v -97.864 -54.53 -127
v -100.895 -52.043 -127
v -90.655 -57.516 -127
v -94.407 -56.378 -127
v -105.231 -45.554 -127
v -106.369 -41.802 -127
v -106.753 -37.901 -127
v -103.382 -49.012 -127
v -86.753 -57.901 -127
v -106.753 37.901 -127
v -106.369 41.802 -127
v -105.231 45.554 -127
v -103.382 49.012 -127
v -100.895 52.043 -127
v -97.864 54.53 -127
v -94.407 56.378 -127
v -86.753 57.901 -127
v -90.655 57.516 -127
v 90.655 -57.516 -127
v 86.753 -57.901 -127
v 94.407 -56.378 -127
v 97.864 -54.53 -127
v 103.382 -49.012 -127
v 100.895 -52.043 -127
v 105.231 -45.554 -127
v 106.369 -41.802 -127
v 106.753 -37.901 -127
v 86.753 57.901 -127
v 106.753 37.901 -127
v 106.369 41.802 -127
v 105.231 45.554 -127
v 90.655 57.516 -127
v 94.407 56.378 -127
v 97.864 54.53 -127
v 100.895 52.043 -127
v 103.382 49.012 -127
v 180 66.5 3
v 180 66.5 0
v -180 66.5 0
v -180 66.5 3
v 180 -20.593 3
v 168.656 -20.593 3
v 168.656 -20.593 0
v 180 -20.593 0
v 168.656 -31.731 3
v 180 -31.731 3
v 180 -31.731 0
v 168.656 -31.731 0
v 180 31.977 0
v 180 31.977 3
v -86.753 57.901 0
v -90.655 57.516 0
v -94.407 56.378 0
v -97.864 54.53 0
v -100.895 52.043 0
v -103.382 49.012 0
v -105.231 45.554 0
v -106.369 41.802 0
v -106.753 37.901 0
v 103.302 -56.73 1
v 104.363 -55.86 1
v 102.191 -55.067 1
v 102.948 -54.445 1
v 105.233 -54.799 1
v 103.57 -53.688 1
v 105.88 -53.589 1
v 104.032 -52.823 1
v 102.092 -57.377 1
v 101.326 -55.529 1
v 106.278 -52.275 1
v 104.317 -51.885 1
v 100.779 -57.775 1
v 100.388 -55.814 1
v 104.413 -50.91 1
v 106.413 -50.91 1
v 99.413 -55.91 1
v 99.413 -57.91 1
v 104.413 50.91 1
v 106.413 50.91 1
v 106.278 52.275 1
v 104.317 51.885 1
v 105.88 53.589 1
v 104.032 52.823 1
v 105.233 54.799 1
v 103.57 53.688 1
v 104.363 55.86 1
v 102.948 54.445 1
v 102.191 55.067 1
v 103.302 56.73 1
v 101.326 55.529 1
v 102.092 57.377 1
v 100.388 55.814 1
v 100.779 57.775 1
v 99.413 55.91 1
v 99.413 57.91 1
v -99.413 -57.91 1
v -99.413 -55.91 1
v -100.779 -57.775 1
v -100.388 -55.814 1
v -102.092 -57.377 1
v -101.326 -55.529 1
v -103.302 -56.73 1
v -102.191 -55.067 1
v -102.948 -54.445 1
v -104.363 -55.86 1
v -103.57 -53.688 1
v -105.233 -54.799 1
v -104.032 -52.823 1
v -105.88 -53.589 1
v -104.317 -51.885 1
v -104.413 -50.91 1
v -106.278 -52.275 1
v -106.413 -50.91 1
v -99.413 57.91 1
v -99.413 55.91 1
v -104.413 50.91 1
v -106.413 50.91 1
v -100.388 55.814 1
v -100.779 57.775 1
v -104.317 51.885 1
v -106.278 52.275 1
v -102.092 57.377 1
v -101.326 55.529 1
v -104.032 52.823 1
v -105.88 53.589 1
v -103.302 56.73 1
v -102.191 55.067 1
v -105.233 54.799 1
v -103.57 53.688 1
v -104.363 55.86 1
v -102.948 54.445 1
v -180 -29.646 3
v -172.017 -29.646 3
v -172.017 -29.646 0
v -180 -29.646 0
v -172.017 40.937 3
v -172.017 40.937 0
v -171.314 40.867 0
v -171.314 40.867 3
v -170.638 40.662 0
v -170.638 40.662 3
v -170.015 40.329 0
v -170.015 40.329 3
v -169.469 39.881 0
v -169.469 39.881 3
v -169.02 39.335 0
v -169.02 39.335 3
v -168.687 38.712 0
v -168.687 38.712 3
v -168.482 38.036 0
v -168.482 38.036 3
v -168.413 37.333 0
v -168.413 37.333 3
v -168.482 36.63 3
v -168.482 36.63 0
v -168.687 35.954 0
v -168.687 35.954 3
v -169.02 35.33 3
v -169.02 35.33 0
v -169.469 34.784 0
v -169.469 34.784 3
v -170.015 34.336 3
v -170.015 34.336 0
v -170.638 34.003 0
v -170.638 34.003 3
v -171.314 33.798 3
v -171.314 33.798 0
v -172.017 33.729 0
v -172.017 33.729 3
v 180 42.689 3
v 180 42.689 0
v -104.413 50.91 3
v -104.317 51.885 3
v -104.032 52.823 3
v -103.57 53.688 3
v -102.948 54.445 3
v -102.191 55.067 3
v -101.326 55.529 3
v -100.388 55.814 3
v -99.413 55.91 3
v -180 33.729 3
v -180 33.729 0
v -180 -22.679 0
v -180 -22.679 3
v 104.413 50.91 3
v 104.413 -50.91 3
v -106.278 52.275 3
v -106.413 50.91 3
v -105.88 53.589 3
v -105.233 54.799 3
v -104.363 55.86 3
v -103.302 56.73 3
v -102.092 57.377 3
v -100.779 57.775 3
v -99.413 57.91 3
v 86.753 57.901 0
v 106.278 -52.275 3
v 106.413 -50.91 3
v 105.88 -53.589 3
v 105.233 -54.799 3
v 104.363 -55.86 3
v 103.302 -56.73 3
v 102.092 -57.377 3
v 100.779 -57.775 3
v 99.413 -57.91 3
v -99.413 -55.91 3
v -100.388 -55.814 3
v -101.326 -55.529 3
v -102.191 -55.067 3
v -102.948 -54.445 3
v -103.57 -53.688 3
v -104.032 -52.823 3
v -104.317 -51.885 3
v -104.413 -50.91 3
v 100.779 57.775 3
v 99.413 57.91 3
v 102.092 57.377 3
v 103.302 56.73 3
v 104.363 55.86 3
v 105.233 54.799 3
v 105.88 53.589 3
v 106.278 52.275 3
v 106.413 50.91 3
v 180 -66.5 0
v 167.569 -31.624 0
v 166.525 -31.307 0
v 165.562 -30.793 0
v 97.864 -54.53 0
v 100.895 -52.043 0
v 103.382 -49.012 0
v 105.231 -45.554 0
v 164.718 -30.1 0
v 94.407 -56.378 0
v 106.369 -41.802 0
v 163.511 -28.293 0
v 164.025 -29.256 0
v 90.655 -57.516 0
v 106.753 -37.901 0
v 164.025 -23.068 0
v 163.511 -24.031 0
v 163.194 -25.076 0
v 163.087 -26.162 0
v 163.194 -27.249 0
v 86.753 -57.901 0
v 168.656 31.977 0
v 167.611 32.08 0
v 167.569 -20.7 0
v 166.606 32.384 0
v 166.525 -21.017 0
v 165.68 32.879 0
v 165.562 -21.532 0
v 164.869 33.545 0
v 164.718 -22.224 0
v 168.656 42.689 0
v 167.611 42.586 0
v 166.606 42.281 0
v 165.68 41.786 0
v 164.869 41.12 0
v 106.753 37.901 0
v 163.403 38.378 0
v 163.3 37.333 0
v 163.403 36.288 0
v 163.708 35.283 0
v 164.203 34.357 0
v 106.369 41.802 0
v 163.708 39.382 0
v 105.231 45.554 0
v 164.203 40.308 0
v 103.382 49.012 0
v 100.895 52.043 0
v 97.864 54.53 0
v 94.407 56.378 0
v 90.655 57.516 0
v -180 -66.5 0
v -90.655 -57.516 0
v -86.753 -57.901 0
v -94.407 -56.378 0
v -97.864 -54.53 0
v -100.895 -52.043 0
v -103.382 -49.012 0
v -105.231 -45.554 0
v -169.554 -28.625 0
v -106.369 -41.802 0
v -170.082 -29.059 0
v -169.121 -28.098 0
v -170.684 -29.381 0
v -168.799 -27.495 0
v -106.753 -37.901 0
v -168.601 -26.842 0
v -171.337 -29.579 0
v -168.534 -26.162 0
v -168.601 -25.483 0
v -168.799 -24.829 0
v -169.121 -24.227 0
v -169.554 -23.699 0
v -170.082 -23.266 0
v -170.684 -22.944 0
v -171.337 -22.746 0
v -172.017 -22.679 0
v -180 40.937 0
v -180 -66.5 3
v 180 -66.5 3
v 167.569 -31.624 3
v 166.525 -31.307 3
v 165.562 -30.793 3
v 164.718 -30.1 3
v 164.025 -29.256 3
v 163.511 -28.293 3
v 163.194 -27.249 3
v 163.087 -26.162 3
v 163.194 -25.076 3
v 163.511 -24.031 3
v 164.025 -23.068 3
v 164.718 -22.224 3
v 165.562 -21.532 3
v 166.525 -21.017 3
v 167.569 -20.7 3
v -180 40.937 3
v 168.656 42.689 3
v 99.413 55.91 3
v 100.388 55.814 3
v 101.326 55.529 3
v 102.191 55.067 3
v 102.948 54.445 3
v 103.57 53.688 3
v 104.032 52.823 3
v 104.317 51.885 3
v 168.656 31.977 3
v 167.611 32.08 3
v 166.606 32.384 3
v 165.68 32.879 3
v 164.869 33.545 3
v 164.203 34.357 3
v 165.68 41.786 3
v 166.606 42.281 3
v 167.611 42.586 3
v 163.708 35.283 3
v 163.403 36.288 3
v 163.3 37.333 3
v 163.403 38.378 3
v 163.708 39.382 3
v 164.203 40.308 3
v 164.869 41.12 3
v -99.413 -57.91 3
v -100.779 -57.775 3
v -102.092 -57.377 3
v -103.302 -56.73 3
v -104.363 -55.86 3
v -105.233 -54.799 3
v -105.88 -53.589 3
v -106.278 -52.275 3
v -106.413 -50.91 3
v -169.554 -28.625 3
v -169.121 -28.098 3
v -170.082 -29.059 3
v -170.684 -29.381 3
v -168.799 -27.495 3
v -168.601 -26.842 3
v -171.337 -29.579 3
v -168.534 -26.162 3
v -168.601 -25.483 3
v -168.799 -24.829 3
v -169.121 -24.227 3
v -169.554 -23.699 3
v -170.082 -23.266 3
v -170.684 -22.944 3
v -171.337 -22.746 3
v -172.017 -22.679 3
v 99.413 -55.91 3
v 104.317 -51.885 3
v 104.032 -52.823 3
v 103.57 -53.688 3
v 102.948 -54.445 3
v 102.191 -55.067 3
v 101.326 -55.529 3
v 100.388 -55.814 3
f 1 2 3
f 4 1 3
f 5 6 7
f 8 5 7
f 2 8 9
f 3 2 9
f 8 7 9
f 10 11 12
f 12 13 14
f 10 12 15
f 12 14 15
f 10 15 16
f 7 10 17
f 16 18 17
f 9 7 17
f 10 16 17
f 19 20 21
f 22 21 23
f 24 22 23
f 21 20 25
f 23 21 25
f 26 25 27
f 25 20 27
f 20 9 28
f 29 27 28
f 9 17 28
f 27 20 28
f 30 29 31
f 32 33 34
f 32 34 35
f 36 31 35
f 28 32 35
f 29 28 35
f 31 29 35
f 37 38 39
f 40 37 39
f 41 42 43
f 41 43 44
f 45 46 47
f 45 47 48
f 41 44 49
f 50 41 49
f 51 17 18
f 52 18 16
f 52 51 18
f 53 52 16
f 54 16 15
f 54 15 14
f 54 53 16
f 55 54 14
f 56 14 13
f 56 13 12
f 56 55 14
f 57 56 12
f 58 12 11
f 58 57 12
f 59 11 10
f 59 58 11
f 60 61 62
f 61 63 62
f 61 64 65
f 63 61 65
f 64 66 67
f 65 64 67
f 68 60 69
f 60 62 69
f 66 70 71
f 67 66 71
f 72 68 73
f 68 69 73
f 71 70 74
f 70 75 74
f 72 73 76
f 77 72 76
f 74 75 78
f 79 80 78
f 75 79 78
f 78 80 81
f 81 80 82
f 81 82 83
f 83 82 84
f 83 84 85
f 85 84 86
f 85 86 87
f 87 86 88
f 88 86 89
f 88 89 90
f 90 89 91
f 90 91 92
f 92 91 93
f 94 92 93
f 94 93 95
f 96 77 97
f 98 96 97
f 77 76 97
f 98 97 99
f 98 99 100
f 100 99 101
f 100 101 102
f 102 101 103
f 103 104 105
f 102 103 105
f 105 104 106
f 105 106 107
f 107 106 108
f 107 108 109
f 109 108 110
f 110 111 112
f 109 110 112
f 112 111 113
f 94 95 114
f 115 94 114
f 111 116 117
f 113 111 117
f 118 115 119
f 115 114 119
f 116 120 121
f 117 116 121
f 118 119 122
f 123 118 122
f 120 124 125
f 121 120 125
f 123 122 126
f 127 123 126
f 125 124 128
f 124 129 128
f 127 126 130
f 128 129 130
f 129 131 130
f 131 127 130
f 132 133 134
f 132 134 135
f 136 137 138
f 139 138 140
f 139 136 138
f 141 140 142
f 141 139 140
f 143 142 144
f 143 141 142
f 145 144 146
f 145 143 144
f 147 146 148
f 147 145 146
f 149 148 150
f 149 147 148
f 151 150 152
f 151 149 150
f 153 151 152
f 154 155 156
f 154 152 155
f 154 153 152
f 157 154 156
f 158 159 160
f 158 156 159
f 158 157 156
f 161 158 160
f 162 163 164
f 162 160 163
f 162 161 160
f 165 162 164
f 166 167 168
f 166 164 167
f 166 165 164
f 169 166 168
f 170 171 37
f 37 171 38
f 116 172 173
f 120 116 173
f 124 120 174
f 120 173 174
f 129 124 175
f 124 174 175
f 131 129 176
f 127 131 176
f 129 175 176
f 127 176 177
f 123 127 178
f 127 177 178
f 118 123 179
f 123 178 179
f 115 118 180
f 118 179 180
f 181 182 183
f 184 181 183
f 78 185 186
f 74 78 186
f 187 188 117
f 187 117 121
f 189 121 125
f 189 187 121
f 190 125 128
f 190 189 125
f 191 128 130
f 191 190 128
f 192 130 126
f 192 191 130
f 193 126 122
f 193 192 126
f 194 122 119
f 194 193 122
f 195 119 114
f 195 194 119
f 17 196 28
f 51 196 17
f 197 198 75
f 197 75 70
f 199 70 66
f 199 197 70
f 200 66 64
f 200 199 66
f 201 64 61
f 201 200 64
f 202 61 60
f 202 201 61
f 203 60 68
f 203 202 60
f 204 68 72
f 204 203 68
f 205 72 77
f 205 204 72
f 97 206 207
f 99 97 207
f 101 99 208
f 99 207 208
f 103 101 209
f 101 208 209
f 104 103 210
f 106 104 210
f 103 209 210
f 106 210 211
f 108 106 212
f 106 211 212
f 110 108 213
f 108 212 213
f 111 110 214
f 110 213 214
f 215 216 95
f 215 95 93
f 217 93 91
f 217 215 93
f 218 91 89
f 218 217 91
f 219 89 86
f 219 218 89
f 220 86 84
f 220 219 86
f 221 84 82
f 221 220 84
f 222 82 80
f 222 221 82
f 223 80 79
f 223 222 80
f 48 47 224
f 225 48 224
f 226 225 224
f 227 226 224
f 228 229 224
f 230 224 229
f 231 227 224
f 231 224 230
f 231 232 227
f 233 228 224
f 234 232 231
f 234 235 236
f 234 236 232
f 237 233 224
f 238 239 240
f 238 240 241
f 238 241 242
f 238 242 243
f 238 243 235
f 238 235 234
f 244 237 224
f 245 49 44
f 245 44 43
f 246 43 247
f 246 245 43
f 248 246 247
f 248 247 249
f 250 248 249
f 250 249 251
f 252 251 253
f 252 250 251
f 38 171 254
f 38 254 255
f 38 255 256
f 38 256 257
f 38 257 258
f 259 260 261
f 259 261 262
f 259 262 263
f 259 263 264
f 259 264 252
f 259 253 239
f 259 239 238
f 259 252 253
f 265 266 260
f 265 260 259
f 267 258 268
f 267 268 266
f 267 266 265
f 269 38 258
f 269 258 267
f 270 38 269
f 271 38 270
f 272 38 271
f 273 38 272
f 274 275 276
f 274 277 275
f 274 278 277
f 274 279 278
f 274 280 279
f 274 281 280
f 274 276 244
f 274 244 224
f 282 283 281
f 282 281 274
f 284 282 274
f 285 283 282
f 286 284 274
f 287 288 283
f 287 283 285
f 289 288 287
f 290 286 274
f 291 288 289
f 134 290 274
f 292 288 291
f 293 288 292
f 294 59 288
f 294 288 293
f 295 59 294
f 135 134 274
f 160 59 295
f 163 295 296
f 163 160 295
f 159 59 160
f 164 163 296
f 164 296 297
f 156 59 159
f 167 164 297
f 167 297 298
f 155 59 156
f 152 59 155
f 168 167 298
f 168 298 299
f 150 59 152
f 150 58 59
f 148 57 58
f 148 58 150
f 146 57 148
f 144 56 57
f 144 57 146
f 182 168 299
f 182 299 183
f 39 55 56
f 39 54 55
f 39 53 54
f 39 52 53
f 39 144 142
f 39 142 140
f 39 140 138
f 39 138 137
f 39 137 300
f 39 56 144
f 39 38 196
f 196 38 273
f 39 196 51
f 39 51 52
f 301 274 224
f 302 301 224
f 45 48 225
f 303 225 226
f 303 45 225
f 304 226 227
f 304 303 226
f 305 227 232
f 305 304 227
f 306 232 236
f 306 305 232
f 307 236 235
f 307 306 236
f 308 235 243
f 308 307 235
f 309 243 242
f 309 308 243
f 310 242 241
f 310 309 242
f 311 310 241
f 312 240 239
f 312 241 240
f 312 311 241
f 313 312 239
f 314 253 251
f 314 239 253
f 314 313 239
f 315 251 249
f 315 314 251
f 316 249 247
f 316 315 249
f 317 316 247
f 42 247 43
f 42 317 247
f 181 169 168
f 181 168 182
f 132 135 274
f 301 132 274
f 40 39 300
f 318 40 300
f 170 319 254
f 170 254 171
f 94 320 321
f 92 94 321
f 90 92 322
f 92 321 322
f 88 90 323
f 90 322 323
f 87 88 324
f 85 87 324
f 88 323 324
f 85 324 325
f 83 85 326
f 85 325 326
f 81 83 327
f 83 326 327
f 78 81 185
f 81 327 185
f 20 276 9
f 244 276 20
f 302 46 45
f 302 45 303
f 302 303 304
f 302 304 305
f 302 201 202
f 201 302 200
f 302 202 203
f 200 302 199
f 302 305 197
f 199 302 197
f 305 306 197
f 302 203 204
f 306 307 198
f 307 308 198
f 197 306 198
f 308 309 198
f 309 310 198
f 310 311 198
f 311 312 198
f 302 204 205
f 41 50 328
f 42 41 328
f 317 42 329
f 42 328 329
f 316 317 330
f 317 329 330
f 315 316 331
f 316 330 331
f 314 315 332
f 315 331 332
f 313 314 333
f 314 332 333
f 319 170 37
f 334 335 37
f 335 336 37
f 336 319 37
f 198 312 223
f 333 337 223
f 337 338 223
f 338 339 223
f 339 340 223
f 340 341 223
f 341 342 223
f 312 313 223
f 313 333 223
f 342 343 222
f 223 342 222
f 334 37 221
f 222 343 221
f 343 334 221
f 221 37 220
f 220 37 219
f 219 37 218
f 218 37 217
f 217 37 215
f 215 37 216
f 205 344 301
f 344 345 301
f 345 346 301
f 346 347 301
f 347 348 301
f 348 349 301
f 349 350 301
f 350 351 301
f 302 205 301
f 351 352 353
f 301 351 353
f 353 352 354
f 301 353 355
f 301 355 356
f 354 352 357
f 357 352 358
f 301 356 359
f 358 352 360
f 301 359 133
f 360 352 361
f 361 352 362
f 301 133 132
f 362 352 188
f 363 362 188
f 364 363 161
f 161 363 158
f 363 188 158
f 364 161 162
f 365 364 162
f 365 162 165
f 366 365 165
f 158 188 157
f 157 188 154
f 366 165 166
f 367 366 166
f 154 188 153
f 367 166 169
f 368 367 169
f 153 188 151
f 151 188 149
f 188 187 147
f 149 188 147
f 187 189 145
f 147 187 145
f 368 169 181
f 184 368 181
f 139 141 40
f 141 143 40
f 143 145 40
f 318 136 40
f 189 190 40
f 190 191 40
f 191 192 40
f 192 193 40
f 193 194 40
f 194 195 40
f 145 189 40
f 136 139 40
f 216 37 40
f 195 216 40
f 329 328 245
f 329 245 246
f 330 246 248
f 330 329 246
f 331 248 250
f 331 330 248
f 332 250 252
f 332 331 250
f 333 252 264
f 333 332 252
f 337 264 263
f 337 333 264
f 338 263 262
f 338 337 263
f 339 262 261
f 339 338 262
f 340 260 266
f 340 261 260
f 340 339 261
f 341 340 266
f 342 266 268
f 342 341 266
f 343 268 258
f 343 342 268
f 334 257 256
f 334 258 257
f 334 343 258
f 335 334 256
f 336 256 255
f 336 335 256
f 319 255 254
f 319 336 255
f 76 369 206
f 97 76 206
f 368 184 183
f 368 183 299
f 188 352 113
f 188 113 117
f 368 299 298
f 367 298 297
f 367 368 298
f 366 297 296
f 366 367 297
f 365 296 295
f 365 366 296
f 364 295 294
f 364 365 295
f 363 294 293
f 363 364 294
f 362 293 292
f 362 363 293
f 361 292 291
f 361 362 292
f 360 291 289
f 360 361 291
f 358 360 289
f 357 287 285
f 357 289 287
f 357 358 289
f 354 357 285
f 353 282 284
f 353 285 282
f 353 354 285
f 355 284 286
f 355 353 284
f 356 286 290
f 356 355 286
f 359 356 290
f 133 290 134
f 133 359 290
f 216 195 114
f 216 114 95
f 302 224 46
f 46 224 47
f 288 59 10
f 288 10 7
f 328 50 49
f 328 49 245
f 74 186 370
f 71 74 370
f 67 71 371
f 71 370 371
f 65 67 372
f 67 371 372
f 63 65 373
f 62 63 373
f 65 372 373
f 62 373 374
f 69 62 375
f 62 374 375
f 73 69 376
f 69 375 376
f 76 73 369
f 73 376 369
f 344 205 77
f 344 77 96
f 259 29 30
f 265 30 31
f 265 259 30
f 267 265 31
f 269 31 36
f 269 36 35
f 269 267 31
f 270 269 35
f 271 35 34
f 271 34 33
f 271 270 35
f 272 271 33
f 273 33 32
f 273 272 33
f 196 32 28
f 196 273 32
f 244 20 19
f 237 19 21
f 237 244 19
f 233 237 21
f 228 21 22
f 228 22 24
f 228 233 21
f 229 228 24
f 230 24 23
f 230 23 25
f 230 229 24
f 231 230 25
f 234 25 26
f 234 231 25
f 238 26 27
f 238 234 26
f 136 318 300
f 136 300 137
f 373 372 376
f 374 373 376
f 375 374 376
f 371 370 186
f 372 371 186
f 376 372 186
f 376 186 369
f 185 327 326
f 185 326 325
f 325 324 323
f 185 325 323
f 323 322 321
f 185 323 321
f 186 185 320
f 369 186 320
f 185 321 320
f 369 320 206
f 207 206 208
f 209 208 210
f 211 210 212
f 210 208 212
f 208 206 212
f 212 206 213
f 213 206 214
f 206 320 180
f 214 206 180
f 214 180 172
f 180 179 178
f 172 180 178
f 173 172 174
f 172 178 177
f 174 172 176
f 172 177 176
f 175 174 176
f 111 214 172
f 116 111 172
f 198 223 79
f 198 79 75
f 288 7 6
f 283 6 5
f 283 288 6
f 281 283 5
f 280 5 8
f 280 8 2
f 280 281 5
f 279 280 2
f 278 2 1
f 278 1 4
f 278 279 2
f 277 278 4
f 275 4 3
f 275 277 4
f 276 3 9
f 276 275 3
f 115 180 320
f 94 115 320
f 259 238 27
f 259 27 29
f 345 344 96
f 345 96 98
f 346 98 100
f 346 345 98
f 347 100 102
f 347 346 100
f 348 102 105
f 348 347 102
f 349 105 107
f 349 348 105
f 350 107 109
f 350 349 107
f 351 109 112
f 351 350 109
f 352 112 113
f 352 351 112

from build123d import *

# Parameters (mm, degrees)
SALIENTE_EXTRUIR1_DEPTH = 3
SALIENTE_EXTRUIR2_DEPTH = 130
CORTAR_EXTRUIR1_DEPTH   = 2
CORTAR_EXTRUIR2_DEPTH   = 29


with BuildPart() as part:
    # Croquis1 → Saliente-Extruir1 (new body)
    with BuildSketch(Plane.XY):
        Polygon((-180, 59.5), (-180, 66.5), (-173, 66.5), (173, 66.5), (180, 66.5), (180, 59.5), (180, -59.5), (180, -66.5), (173, -66.5), (-173, -66.5), (-180, -66.5), (-180, -59.5), align=None)
        with BuildLine():
            Line((-86.752968629, 57.900573009), (86.752968629, 57.900573009))
            ThreePointArc((86.752968629, 57.900573009), (100.895104253, 52.042708633), (106.752968629, 37.900573009))
            Line((106.752968629, 37.900573009), (106.752968629, -37.900573009))
            ThreePointArc((106.752968629, -37.900573009), (100.895104253, -52.042708633), (86.752968629, -57.900573009))
            Line((86.752968629, -57.900573009), (-86.752968629, -57.900573009))
            ThreePointArc((-86.752968629, -57.900573009), (-100.895104253, -52.042708633), (-106.752968629, -37.900573009))
            Line((-106.752968629, -37.900573009), (-106.752968629, 37.900573009))
            ThreePointArc((-106.752968629, 37.900573009), (-100.895104253, 52.042708633), (-86.752968629, 57.900573009))
        make_face(mode=Mode.SUBTRACT)
    extrude(amount=SALIENTE_EXTRUIR1_DEPTH)

    # Croquis2 → Saliente-Extruir2 (add)
    with BuildSketch(Plane.XY.offset(3)):
        with BuildLine():
            Line((-106.752968629, 37.900573009), (-106.752968629, -37.900573009))
            ThreePointArc((-106.752968629, -37.900573009), (-100.895104253, -52.042708633), (-86.752968629, -57.900573009))
            Line((-86.752968629, -57.900573009), (86.752968629, -57.900573009))
            ThreePointArc((86.752968629, -57.900573009), (100.895104253, -52.042708633), (106.752968629, -37.900573009))
            Line((106.752968629, -37.900573009), (106.752968629, 37.900573009))
            ThreePointArc((106.752968629, 37.900573009), (100.895104253, 52.042708633), (86.752968629, 57.900573009))
            Line((86.752968629, 57.900573009), (-86.752968629, 57.900573009))
            ThreePointArc((-86.752968629, 57.900573009), (-100.895104253, 52.042708633), (-106.752968629, 37.900573009))
        make_face()
    extrude(amount=-SALIENTE_EXTRUIR2_DEPTH)

    # Croquis3 → Cortar-Extruir1 (cut)
    with BuildSketch(Plane.XY.offset(3)):
        with BuildLine():
            Line((99.412909993, -57.909788035), (-99.412909993, -57.909788035))
            ThreePointArc((-99.412909993, -57.909788035), (-104.362657461, -55.859535503), (-106.412909993, -50.909788035))
            Line((-106.412909993, -50.909788035), (-106.412909993, 50.909788035))
            ThreePointArc((-106.412909993, 50.909788035), (-104.362657461, 55.859535503), (-99.412909993, 57.909788035))
            Line((-99.412909993, 57.909788035), (99.412909993, 57.909788035))
            ThreePointArc((99.412909993, 57.909788035), (104.362657461, 55.859535503), (106.412909993, 50.909788035))
            Line((106.412909993, 50.909788035), (106.412909993, -50.909788035))
            ThreePointArc((106.412909993, -50.909788035), (104.362657461, -55.859535503), (99.412909993, -57.909788035))
        make_face()
        with BuildLine():
            Line((-104.412909993, -50.909788035), (-104.412909993, 50.909788035))
            ThreePointArc((-104.412909993, 50.909788035), (-102.948443899, 54.445321941), (-99.412909993, 55.909788035))
            Line((-99.412909993, 55.909788035), (99.412909993, 55.909788035))
            ThreePointArc((99.412909993, 55.909788035), (102.948443899, 54.445321941), (104.412909993, 50.909788035))
            Line((104.412909993, 50.909788035), (104.412909993, -50.909788035))
            ThreePointArc((104.412909993, -50.909788035), (102.948443899, -54.445321941), (99.412909993, -55.909788035))
            Line((99.412909993, -55.909788035), (-99.412909993, -55.909788035))
            ThreePointArc((-99.412909993, -55.909788035), (-102.948443899, -54.445321941), (-104.412909993, -50.909788035))
        make_face(mode=Mode.SUBTRACT)
    extrude(amount=-CORTAR_EXTRUIR1_DEPTH, mode=Mode.SUBTRACT)

    # Croquis4 → Cortar-Extruir2 (cut)
    with BuildSketch(Plane.XY.offset(3)):
        with BuildLine():
            Line((-180, 40.936641428), (-172.017039574, 40.936641428))
            ThreePointArc((-172.017039574, 40.936641428), (-168.413104138, 37.332705992), (-172.017039574, 33.728770556))
            Line((-172.017039574, 33.728770556), (-180, 33.728770556))
            ThreePointArc((-180, 33.728770556), (-183.603935436, 37.332705992), (-180, 40.936641428))
        make_face()
        with BuildLine():
            Line((-180, -22.678860967), (-172.017039574, -22.678860967))
            ThreePointArc((-172.017039574, -22.678860967), (-168.533610515, -26.162290026), (-172.017039574, -29.645719085))
            Line((-172.017039574, -29.645719085), (-180, -29.645719085))
            ThreePointArc((-180, -29.645719085), (-183.483429059, -26.162290026), (-180, -22.678860967))
        make_face()
        with BuildLine():
            Line((180, 31.976759047), (168.655882601, 31.976759047))
            ThreePointArc((168.655882601, 31.976759047), (163.299935657, 37.332705992), (168.655882601, 42.688652937))
            Line((168.655882601, 42.688652937), (180, 42.688652937))
            ThreePointArc((180, 42.688652937), (185.355946945, 37.332705992), (180, 31.976759047))
        make_face()
        with BuildLine():
            Line((180, -31.731355776), (168.655882601, -31.731355776))
            ThreePointArc((168.655882601, -31.731355776), (163.086816851, -26.162290026), (168.655882601, -20.593224276))
            Line((168.655882601, -20.593224276), (180, -20.593224276))
            ThreePointArc((180, -20.593224276), (185.56906575, -26.162290026), (180, -31.731355776))
        make_face()
    extrude(amount=-CORTAR_EXTRUIR2_DEPTH, mode=Mode.SUBTRACT)


solid = part.part
